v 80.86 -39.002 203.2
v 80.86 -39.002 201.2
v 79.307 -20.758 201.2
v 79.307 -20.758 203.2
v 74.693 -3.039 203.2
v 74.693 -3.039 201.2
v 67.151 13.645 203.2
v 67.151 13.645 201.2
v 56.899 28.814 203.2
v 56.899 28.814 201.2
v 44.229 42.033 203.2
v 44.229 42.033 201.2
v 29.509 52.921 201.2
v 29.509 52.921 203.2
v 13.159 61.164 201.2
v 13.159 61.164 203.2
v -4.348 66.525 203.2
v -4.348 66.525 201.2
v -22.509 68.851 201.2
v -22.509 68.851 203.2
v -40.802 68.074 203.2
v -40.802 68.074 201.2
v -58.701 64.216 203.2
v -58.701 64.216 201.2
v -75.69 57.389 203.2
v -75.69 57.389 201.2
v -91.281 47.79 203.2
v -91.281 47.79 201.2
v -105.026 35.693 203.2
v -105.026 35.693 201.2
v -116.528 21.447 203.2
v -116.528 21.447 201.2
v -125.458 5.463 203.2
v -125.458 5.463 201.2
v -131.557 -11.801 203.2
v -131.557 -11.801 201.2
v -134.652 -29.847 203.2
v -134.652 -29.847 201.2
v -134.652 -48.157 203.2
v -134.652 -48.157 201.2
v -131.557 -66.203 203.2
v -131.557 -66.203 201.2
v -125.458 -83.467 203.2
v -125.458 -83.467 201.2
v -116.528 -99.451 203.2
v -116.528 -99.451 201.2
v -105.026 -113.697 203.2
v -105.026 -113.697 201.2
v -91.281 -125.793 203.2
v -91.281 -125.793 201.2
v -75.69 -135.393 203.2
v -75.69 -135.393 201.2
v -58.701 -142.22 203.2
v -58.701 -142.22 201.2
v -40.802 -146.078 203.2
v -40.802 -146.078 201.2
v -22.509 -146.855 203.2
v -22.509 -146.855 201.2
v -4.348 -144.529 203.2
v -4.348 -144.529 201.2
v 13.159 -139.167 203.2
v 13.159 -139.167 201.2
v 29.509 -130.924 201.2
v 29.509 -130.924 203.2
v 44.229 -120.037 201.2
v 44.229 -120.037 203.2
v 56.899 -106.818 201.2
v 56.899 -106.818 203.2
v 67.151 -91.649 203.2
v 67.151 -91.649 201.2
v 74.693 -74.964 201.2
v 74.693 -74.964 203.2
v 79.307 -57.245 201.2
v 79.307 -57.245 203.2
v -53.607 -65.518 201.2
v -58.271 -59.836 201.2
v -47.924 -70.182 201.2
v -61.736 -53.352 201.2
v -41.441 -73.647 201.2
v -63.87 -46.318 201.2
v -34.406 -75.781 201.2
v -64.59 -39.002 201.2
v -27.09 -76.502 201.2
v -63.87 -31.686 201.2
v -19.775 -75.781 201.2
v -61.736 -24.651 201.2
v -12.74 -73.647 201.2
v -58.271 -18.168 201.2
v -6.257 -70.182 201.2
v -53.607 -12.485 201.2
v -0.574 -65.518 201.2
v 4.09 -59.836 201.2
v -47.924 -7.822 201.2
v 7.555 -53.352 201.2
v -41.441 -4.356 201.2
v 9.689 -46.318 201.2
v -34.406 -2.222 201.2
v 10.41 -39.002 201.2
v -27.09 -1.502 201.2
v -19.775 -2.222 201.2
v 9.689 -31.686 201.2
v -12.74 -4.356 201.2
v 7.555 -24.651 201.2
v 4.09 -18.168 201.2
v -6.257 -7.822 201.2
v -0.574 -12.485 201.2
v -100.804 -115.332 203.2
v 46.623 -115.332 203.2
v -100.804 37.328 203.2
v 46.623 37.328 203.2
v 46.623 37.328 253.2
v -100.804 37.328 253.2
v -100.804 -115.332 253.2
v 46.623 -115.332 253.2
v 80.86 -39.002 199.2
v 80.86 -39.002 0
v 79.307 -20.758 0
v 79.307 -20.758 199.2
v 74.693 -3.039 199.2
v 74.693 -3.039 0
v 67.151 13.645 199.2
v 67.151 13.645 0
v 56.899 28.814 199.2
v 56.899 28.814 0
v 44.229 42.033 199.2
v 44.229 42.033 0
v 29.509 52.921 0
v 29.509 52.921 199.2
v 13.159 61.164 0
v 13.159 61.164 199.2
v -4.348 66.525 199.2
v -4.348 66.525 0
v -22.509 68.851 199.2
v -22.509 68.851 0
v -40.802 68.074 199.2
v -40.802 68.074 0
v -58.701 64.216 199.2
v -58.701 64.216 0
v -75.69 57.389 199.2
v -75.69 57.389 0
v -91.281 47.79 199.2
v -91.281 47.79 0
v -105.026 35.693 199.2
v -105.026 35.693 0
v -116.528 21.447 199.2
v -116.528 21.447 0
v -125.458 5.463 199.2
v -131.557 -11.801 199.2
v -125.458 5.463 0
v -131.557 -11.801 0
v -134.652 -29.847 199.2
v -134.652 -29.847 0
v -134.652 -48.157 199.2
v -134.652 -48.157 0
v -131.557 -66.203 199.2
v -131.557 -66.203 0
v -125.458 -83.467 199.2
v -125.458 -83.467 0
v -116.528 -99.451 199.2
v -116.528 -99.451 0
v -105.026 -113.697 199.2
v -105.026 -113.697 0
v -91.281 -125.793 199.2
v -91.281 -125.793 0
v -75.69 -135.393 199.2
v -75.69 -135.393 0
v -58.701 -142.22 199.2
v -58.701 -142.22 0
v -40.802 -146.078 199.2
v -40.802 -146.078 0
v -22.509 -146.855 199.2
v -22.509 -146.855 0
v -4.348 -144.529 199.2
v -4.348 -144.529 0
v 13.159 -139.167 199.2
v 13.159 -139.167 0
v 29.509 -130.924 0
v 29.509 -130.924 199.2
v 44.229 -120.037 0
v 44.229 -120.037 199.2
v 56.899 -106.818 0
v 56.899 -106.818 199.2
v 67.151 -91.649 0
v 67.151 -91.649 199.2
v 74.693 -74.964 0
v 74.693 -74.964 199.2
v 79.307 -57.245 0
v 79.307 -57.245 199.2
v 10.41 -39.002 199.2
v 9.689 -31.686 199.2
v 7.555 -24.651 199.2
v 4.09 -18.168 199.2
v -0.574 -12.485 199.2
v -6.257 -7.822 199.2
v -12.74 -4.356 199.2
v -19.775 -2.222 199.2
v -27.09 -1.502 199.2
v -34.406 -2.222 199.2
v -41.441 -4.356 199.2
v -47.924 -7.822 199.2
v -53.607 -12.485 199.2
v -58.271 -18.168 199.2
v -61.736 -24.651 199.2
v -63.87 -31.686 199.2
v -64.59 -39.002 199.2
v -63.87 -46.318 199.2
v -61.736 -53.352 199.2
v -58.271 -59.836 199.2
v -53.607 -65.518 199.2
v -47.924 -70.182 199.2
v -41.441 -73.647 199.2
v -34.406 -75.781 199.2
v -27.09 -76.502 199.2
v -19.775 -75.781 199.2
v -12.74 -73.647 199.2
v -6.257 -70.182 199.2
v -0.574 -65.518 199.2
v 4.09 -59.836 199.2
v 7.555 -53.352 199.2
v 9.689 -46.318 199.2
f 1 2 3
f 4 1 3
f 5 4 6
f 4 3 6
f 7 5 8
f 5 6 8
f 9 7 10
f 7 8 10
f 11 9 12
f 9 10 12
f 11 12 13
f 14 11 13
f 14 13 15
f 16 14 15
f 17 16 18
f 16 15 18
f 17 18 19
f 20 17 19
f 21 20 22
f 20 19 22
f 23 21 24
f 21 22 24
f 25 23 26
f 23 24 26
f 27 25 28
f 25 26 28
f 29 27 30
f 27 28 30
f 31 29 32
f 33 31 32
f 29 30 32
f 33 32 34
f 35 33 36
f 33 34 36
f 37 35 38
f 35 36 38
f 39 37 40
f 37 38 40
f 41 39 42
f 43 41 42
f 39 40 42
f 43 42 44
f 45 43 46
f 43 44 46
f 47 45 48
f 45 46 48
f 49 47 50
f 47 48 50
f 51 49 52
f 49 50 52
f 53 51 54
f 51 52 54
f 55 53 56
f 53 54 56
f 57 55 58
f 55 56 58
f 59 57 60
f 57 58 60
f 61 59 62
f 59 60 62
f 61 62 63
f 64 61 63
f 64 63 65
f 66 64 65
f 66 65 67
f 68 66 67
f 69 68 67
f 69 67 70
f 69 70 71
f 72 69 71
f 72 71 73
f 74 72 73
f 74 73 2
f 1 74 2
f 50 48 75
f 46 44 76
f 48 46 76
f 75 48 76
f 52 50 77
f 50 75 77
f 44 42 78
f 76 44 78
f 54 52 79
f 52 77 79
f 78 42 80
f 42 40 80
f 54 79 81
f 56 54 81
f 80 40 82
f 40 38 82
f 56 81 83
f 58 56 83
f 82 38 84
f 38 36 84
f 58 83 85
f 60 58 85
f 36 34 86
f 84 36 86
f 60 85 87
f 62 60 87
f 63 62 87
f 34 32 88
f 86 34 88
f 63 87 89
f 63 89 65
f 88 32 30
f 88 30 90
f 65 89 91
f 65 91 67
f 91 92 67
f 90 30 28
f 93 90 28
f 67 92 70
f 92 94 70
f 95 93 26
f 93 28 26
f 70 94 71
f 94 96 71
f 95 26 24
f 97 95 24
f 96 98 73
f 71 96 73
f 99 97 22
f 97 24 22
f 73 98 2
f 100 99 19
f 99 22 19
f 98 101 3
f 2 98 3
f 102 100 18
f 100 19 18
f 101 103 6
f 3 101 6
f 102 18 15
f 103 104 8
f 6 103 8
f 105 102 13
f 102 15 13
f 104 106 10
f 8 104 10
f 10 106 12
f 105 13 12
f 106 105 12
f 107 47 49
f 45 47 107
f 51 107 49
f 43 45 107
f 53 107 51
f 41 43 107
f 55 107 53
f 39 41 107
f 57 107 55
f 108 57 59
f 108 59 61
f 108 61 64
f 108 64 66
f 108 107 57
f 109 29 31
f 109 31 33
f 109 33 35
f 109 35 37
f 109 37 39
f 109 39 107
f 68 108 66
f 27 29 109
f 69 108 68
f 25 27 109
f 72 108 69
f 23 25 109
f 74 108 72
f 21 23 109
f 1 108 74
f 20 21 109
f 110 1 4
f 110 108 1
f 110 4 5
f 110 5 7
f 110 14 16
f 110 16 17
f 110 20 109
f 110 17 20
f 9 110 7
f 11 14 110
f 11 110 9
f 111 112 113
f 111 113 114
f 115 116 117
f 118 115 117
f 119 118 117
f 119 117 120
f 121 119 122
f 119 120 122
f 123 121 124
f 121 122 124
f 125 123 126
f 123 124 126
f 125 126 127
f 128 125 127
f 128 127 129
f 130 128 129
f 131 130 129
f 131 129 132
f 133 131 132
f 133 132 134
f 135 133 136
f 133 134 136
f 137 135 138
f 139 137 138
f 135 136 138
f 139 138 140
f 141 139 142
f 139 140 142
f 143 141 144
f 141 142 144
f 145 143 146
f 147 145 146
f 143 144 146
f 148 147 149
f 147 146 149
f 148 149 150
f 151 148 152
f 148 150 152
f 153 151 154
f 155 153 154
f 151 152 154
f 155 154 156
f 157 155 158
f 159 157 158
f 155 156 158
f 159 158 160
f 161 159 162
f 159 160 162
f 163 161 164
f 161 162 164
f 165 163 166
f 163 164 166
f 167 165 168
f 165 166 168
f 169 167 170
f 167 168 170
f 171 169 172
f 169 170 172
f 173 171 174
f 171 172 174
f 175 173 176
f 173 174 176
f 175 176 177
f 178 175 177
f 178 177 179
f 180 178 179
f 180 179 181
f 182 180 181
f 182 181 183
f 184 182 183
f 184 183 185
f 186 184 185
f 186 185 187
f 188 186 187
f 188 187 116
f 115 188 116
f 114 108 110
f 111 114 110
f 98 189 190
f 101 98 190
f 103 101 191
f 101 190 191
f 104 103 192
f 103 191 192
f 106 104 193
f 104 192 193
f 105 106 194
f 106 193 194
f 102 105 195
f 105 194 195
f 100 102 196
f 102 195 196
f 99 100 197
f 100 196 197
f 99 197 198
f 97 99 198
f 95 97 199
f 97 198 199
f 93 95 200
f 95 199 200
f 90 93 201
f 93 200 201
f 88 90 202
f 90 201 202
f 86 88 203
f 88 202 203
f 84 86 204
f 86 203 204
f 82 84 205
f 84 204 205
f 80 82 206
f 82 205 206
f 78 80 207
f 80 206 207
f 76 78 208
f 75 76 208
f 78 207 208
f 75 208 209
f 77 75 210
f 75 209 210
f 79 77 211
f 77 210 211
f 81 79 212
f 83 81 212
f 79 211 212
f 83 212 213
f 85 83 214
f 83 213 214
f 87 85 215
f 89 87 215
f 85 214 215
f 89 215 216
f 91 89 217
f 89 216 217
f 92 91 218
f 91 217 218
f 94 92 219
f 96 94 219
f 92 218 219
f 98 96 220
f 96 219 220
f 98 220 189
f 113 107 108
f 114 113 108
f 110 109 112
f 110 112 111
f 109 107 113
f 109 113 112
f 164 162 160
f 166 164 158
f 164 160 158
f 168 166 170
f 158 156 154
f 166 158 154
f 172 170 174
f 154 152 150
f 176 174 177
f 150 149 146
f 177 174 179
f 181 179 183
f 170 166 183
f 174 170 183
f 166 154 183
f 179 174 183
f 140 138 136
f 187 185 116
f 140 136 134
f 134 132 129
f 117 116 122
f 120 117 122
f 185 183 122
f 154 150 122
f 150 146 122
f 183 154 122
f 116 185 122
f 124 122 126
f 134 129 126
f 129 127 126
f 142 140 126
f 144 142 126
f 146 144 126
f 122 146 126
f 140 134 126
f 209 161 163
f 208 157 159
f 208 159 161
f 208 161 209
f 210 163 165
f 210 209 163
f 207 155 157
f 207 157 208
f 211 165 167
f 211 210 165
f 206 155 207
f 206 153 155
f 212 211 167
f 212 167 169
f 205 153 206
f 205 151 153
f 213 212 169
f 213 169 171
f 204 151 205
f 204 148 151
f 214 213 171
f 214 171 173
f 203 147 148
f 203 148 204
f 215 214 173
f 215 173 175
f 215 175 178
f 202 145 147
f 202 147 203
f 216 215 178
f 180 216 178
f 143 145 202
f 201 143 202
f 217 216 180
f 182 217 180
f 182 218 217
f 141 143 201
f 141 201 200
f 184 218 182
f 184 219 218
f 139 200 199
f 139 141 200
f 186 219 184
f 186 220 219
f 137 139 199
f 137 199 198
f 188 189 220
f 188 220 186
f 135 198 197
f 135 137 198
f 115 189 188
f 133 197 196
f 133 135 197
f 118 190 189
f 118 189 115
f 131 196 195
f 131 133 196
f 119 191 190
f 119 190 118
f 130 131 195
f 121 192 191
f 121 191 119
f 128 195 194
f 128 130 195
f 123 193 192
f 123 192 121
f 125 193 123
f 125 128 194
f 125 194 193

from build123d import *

# Parameters (mm, degrees)
F0_R     = 107.95
F1_DEPTH = 199.2
F2_R     = 37.5
F3_DEPTH = 2
F4_R     = 107.95
F5_DEPTH = 2
F6_W     = 147.4276631508
F6_H     = 152.66
F7_DEPTH = 50


with BuildPart() as f1:
    # F0 (on Top) → F1 (new body)
    with BuildSketch(Plane.XY):
        with Locations((-27.0904134959, -39.0018522739)):
            Circle(F0_R)
    extrude(amount=F1_DEPTH)

    # F2 (on face) → F3 (join)
    with BuildSketch(Plane.XY.offset(199.2)):
        with Locations((-27.0904134959, -39.0018522739)):
            Circle(F2_R)
    extrude(amount=F3_DEPTH)

    # F4 (on face) → F5 (join)
    with BuildSketch(Plane.XY.offset(201.2)):
        with Locations((-27.0904134959, -39.0018522739)):
            Circle(F4_R)
    extrude(amount=F5_DEPTH)

    # F6 (on face) → F7 (join)
    with BuildSketch(Plane.XY.offset(203.2)):
        with Locations((-27.0904134959, -39.0018522739)):
            Rectangle(F6_W, F6_H)
    extrude(amount=F7_DEPTH)


solid = f1.part
